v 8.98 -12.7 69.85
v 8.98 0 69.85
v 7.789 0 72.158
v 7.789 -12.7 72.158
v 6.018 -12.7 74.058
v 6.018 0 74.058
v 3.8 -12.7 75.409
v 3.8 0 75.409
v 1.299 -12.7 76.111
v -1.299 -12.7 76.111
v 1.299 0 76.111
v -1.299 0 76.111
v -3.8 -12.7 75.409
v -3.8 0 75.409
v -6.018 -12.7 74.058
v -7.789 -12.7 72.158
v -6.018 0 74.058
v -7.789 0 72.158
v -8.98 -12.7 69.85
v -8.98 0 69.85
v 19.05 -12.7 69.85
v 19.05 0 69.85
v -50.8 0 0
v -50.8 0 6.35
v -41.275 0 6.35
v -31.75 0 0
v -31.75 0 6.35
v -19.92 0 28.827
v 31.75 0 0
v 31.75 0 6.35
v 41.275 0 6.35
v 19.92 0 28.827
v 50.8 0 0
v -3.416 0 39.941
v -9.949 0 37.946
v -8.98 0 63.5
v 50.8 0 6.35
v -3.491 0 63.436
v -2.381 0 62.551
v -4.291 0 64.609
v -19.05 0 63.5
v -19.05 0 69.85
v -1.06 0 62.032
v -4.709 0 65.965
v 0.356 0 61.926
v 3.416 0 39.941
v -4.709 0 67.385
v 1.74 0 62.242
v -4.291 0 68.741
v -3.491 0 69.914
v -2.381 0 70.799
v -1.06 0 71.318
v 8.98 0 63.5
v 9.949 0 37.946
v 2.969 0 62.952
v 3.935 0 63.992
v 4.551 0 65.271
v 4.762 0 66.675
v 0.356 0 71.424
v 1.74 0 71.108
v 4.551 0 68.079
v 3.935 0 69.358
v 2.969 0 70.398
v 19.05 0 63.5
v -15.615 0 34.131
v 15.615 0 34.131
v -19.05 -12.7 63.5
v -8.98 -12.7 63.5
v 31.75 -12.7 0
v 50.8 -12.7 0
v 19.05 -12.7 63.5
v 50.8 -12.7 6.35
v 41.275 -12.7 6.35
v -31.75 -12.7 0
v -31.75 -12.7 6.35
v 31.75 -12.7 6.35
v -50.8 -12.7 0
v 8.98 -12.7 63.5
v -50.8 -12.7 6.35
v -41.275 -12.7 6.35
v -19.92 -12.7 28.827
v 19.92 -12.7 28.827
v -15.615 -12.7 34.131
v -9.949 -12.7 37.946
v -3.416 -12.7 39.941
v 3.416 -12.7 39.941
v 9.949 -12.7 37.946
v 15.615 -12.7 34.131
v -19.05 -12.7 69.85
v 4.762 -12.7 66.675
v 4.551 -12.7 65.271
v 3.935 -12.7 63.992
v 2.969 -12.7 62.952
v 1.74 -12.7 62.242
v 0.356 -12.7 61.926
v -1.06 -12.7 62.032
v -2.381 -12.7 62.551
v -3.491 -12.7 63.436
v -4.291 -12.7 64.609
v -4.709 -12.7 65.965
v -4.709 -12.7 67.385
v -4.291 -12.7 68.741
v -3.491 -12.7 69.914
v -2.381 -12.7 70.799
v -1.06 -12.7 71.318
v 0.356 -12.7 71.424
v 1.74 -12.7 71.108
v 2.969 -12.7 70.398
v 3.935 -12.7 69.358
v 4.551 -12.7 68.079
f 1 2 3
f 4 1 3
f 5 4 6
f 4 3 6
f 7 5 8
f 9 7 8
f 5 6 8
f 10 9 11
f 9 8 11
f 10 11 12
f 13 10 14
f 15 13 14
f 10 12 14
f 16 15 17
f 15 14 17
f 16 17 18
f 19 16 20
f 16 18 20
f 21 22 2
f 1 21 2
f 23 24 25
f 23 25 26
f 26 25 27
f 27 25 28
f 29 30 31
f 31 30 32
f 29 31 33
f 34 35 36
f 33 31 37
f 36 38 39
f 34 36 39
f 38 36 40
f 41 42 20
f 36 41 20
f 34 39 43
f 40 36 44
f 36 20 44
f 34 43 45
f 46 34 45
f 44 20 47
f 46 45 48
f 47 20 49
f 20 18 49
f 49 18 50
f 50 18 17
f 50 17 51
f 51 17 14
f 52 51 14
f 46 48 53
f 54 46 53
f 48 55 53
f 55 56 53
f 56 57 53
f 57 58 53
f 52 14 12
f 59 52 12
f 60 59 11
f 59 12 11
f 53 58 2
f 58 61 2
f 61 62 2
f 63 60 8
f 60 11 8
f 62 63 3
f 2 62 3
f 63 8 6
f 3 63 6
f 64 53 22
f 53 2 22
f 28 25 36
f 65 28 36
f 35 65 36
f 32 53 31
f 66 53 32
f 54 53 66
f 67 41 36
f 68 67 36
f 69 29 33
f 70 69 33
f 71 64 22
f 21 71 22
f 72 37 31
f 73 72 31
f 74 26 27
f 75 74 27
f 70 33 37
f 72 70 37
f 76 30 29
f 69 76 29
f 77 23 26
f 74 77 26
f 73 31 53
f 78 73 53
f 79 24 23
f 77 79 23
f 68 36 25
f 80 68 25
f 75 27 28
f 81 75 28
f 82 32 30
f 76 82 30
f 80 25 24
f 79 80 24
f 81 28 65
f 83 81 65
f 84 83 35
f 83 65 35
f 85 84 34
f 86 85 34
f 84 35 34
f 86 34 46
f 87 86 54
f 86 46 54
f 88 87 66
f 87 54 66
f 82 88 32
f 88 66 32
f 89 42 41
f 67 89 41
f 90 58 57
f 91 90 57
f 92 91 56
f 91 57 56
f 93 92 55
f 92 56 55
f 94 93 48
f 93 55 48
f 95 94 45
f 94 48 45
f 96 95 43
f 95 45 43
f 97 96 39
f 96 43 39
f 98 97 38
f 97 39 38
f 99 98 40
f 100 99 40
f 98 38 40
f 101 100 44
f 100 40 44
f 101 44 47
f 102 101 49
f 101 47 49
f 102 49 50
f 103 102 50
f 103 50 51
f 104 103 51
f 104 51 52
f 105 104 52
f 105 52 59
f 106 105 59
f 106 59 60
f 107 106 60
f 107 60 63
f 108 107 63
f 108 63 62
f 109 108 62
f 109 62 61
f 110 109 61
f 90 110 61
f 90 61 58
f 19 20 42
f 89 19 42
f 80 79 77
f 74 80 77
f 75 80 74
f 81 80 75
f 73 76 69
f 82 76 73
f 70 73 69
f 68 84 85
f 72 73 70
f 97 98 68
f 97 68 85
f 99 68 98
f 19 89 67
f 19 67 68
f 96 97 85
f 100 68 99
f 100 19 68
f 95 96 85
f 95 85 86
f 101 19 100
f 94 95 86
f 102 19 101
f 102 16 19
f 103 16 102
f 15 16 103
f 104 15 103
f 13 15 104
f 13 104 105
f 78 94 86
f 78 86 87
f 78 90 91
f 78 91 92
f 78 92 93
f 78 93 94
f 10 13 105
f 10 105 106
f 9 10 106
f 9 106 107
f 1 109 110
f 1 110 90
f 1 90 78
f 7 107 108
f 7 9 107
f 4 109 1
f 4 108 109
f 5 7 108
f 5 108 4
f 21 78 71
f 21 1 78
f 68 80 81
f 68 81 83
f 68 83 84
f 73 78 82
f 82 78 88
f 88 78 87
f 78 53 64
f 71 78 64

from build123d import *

# Parameters (mm, degrees)
F1_DEPTH = 12.7
F2_DEPTH = 12.7


with BuildPart() as f1:
    # F0 (on Front) → F1 (new body)
    with BuildSketch(Plane.XZ):
        with BuildLine():
            Line((-50.8, 6.35), (-50.8, 0))
            Line((-50.8, 0), (-31.75, 0))
            Line((-31.75, 0), (-31.75, 6.35))
            Line((-31.75, 6.35), (-19.920041, 28.826923))
            ThreePointArc((-19.920041, 28.826923), (0, 40.194522), (19.920041, 28.826923))
            Line((19.920041, 28.826923), (31.75, 6.35))
            Line((31.75, 6.35), (31.75, 0))
            Line((31.75, 0), (50.8, 0))
            Line((50.8, 0), (50.8, 6.35))
            Line((50.8, 6.35), (41.275, 6.35))
            Line((41.275, 6.35), (8.980256, 63.5))
            Line((8.980256, 63.5), (19.05, 63.5))
            Line((19.05, 63.5), (19.05, 66.675))
            Line((19.05, 66.675), (9.525, 66.675))
            Line((9.525, 66.675), (4.7625, 66.675))
            ThreePointArc((4.7625, 66.675), (0, 61.9125), (-4.7625, 66.675))
            Line((-4.7625, 66.675), (-9.525, 66.675))
            Line((-9.525, 66.675), (-19.05, 66.675))
            Line((-19.05, 66.675), (-19.05, 63.5))
            Line((-19.05, 63.5), (-8.980256, 63.5))
            Line((-8.980256, 63.5), (-41.275, 6.35))
            Line((-41.275, 6.35), (-50.8, 6.35))
        make_face()
    extrude(amount=F1_DEPTH)

    # F0 (on Front) → F2 (join)
    with BuildSketch(Plane.XZ):
        with BuildLine():
            Line((-19.05, 69.85), (-19.05, 66.675))
            Line((-19.05, 66.675), (-9.525, 66.675))
            Line((-9.525, 66.675), (-4.7625, 66.675))
            ThreePointArc((-4.7625, 66.675), (0, 71.4375), (4.7625, 66.675))
            Line((4.7625, 66.675), (9.525, 66.675))
            Line((9.525, 66.675), (19.05, 66.675))
            Line((19.05, 66.675), (19.05, 69.85))
            Line((19.05, 69.85), (8.980256, 69.85))
            ThreePointArc((8.980256, 69.85), (0, 76.2), (-8.980256, 69.85))
            Line((-8.980256, 69.85), (-19.05, 69.85))
        make_face()
    extrude(amount=F2_DEPTH)


solid = f1.part
